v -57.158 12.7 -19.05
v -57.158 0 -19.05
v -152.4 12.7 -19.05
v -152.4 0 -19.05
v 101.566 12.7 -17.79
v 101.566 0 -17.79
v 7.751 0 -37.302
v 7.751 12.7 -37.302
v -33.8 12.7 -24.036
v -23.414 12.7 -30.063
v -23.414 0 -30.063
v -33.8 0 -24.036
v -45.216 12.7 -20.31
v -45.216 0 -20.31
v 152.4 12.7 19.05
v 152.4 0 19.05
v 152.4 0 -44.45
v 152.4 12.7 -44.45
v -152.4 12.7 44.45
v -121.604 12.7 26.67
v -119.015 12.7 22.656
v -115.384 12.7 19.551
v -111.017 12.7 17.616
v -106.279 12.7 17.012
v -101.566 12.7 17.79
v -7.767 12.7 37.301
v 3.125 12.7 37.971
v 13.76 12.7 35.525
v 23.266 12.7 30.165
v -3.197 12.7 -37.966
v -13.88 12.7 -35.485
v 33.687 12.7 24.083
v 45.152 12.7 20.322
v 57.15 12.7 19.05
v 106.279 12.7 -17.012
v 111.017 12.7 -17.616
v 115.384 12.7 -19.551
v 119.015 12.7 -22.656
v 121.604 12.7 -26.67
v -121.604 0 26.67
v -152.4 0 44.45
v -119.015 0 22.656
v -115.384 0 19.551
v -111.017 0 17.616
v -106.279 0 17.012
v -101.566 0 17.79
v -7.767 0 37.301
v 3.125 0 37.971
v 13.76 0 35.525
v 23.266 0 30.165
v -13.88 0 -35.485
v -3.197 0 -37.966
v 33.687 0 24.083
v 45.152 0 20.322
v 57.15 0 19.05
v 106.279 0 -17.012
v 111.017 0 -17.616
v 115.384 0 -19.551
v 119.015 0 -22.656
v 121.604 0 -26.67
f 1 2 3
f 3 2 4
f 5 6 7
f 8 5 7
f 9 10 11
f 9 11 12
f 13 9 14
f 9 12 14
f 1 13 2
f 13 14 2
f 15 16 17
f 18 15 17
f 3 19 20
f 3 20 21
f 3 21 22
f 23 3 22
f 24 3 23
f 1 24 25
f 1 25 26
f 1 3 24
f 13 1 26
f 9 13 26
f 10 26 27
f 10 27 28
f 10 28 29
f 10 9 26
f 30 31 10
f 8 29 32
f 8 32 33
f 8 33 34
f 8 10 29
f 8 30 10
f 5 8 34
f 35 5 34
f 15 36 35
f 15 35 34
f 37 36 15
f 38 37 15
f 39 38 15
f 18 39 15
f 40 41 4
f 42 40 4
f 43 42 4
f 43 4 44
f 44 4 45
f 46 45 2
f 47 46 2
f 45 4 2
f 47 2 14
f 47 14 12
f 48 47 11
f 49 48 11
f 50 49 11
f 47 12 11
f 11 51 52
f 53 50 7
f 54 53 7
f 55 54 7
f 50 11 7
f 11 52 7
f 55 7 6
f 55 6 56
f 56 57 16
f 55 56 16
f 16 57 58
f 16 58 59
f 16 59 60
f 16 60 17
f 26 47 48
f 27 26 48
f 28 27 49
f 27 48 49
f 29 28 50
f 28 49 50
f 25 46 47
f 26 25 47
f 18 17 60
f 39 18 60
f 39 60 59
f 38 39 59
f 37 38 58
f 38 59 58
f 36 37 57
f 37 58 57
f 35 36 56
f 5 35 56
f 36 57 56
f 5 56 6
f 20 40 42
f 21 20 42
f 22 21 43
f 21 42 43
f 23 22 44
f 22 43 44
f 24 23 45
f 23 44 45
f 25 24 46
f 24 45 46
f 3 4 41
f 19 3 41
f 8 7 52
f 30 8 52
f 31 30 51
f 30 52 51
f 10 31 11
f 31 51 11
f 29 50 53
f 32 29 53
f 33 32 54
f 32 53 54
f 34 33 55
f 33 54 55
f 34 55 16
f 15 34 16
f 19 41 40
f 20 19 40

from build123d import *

# Parameters (mm, degrees)
SKETCH1_R           = 38.1
BOSS_EXTRUDE1_DEPTH = 12.7


with BuildPart() as part:
    # Sketch1 → Boss-Extrude1 (new body)
    with BuildSketch(Plane(origin=(0, 0, 0), x_dir=(1, 0, 0), z_dir=(0, 1, 0))):
        with BuildLine():
            Line((-57.15762, 19.05), (-152.4, 19.05))
            Line((-152.4, 19.05), (-152.4, -44.45))
            Line((-152.4, -44.45), (-121.604136641, -26.67))
            ThreePointArc((-121.604136641, -26.67), (-113.271041312, -18.424847404), (-101.565513762, -17.789517681))
            Line((-101.565513762, -17.789517681), (-7.767081629, -37.301484625))
            ThreePointArc((-7.767081629, -37.301484625), (-37.11967814, -8.620042959), (-23.413788565, 30.062622525))
            ThreePointArc((-23.413788565, 30.062622525), (-39.409915819, 21.872803477), (-57.15762, 19.05))
        make_face()
        with Locations((-0.00762, 0)):
            Circle(SKETCH1_R)
        with BuildLine():
            Line((152.4, -19.05), (152.4, 44.45))
            Line((152.4, 44.45), (121.604136641, 26.67))
            ThreePointArc((121.604136641, 26.67), (113.271041375, 18.424847303), (101.565513804, 17.789517483))
            Line((101.565513804, 17.789517483), (7.750633458, 37.301735929))
            ThreePointArc((7.750633458, 37.301735929), (29.549100528, 24.041844181), (38.09238, 0))
            ThreePointArc((38.09238, 0), (34.18553193, -16.805902567), (23.266219313, -30.165185291))
            ThreePointArc((23.266219313, -30.165185291), (39.319843399, -21.899781819), (57.15, -19.05))
            Line((57.15, -19.05), (152.4, -19.05))
        make_face()
    extrude(amount=BOSS_EXTRUDE1_DEPTH)


solid = part.part
